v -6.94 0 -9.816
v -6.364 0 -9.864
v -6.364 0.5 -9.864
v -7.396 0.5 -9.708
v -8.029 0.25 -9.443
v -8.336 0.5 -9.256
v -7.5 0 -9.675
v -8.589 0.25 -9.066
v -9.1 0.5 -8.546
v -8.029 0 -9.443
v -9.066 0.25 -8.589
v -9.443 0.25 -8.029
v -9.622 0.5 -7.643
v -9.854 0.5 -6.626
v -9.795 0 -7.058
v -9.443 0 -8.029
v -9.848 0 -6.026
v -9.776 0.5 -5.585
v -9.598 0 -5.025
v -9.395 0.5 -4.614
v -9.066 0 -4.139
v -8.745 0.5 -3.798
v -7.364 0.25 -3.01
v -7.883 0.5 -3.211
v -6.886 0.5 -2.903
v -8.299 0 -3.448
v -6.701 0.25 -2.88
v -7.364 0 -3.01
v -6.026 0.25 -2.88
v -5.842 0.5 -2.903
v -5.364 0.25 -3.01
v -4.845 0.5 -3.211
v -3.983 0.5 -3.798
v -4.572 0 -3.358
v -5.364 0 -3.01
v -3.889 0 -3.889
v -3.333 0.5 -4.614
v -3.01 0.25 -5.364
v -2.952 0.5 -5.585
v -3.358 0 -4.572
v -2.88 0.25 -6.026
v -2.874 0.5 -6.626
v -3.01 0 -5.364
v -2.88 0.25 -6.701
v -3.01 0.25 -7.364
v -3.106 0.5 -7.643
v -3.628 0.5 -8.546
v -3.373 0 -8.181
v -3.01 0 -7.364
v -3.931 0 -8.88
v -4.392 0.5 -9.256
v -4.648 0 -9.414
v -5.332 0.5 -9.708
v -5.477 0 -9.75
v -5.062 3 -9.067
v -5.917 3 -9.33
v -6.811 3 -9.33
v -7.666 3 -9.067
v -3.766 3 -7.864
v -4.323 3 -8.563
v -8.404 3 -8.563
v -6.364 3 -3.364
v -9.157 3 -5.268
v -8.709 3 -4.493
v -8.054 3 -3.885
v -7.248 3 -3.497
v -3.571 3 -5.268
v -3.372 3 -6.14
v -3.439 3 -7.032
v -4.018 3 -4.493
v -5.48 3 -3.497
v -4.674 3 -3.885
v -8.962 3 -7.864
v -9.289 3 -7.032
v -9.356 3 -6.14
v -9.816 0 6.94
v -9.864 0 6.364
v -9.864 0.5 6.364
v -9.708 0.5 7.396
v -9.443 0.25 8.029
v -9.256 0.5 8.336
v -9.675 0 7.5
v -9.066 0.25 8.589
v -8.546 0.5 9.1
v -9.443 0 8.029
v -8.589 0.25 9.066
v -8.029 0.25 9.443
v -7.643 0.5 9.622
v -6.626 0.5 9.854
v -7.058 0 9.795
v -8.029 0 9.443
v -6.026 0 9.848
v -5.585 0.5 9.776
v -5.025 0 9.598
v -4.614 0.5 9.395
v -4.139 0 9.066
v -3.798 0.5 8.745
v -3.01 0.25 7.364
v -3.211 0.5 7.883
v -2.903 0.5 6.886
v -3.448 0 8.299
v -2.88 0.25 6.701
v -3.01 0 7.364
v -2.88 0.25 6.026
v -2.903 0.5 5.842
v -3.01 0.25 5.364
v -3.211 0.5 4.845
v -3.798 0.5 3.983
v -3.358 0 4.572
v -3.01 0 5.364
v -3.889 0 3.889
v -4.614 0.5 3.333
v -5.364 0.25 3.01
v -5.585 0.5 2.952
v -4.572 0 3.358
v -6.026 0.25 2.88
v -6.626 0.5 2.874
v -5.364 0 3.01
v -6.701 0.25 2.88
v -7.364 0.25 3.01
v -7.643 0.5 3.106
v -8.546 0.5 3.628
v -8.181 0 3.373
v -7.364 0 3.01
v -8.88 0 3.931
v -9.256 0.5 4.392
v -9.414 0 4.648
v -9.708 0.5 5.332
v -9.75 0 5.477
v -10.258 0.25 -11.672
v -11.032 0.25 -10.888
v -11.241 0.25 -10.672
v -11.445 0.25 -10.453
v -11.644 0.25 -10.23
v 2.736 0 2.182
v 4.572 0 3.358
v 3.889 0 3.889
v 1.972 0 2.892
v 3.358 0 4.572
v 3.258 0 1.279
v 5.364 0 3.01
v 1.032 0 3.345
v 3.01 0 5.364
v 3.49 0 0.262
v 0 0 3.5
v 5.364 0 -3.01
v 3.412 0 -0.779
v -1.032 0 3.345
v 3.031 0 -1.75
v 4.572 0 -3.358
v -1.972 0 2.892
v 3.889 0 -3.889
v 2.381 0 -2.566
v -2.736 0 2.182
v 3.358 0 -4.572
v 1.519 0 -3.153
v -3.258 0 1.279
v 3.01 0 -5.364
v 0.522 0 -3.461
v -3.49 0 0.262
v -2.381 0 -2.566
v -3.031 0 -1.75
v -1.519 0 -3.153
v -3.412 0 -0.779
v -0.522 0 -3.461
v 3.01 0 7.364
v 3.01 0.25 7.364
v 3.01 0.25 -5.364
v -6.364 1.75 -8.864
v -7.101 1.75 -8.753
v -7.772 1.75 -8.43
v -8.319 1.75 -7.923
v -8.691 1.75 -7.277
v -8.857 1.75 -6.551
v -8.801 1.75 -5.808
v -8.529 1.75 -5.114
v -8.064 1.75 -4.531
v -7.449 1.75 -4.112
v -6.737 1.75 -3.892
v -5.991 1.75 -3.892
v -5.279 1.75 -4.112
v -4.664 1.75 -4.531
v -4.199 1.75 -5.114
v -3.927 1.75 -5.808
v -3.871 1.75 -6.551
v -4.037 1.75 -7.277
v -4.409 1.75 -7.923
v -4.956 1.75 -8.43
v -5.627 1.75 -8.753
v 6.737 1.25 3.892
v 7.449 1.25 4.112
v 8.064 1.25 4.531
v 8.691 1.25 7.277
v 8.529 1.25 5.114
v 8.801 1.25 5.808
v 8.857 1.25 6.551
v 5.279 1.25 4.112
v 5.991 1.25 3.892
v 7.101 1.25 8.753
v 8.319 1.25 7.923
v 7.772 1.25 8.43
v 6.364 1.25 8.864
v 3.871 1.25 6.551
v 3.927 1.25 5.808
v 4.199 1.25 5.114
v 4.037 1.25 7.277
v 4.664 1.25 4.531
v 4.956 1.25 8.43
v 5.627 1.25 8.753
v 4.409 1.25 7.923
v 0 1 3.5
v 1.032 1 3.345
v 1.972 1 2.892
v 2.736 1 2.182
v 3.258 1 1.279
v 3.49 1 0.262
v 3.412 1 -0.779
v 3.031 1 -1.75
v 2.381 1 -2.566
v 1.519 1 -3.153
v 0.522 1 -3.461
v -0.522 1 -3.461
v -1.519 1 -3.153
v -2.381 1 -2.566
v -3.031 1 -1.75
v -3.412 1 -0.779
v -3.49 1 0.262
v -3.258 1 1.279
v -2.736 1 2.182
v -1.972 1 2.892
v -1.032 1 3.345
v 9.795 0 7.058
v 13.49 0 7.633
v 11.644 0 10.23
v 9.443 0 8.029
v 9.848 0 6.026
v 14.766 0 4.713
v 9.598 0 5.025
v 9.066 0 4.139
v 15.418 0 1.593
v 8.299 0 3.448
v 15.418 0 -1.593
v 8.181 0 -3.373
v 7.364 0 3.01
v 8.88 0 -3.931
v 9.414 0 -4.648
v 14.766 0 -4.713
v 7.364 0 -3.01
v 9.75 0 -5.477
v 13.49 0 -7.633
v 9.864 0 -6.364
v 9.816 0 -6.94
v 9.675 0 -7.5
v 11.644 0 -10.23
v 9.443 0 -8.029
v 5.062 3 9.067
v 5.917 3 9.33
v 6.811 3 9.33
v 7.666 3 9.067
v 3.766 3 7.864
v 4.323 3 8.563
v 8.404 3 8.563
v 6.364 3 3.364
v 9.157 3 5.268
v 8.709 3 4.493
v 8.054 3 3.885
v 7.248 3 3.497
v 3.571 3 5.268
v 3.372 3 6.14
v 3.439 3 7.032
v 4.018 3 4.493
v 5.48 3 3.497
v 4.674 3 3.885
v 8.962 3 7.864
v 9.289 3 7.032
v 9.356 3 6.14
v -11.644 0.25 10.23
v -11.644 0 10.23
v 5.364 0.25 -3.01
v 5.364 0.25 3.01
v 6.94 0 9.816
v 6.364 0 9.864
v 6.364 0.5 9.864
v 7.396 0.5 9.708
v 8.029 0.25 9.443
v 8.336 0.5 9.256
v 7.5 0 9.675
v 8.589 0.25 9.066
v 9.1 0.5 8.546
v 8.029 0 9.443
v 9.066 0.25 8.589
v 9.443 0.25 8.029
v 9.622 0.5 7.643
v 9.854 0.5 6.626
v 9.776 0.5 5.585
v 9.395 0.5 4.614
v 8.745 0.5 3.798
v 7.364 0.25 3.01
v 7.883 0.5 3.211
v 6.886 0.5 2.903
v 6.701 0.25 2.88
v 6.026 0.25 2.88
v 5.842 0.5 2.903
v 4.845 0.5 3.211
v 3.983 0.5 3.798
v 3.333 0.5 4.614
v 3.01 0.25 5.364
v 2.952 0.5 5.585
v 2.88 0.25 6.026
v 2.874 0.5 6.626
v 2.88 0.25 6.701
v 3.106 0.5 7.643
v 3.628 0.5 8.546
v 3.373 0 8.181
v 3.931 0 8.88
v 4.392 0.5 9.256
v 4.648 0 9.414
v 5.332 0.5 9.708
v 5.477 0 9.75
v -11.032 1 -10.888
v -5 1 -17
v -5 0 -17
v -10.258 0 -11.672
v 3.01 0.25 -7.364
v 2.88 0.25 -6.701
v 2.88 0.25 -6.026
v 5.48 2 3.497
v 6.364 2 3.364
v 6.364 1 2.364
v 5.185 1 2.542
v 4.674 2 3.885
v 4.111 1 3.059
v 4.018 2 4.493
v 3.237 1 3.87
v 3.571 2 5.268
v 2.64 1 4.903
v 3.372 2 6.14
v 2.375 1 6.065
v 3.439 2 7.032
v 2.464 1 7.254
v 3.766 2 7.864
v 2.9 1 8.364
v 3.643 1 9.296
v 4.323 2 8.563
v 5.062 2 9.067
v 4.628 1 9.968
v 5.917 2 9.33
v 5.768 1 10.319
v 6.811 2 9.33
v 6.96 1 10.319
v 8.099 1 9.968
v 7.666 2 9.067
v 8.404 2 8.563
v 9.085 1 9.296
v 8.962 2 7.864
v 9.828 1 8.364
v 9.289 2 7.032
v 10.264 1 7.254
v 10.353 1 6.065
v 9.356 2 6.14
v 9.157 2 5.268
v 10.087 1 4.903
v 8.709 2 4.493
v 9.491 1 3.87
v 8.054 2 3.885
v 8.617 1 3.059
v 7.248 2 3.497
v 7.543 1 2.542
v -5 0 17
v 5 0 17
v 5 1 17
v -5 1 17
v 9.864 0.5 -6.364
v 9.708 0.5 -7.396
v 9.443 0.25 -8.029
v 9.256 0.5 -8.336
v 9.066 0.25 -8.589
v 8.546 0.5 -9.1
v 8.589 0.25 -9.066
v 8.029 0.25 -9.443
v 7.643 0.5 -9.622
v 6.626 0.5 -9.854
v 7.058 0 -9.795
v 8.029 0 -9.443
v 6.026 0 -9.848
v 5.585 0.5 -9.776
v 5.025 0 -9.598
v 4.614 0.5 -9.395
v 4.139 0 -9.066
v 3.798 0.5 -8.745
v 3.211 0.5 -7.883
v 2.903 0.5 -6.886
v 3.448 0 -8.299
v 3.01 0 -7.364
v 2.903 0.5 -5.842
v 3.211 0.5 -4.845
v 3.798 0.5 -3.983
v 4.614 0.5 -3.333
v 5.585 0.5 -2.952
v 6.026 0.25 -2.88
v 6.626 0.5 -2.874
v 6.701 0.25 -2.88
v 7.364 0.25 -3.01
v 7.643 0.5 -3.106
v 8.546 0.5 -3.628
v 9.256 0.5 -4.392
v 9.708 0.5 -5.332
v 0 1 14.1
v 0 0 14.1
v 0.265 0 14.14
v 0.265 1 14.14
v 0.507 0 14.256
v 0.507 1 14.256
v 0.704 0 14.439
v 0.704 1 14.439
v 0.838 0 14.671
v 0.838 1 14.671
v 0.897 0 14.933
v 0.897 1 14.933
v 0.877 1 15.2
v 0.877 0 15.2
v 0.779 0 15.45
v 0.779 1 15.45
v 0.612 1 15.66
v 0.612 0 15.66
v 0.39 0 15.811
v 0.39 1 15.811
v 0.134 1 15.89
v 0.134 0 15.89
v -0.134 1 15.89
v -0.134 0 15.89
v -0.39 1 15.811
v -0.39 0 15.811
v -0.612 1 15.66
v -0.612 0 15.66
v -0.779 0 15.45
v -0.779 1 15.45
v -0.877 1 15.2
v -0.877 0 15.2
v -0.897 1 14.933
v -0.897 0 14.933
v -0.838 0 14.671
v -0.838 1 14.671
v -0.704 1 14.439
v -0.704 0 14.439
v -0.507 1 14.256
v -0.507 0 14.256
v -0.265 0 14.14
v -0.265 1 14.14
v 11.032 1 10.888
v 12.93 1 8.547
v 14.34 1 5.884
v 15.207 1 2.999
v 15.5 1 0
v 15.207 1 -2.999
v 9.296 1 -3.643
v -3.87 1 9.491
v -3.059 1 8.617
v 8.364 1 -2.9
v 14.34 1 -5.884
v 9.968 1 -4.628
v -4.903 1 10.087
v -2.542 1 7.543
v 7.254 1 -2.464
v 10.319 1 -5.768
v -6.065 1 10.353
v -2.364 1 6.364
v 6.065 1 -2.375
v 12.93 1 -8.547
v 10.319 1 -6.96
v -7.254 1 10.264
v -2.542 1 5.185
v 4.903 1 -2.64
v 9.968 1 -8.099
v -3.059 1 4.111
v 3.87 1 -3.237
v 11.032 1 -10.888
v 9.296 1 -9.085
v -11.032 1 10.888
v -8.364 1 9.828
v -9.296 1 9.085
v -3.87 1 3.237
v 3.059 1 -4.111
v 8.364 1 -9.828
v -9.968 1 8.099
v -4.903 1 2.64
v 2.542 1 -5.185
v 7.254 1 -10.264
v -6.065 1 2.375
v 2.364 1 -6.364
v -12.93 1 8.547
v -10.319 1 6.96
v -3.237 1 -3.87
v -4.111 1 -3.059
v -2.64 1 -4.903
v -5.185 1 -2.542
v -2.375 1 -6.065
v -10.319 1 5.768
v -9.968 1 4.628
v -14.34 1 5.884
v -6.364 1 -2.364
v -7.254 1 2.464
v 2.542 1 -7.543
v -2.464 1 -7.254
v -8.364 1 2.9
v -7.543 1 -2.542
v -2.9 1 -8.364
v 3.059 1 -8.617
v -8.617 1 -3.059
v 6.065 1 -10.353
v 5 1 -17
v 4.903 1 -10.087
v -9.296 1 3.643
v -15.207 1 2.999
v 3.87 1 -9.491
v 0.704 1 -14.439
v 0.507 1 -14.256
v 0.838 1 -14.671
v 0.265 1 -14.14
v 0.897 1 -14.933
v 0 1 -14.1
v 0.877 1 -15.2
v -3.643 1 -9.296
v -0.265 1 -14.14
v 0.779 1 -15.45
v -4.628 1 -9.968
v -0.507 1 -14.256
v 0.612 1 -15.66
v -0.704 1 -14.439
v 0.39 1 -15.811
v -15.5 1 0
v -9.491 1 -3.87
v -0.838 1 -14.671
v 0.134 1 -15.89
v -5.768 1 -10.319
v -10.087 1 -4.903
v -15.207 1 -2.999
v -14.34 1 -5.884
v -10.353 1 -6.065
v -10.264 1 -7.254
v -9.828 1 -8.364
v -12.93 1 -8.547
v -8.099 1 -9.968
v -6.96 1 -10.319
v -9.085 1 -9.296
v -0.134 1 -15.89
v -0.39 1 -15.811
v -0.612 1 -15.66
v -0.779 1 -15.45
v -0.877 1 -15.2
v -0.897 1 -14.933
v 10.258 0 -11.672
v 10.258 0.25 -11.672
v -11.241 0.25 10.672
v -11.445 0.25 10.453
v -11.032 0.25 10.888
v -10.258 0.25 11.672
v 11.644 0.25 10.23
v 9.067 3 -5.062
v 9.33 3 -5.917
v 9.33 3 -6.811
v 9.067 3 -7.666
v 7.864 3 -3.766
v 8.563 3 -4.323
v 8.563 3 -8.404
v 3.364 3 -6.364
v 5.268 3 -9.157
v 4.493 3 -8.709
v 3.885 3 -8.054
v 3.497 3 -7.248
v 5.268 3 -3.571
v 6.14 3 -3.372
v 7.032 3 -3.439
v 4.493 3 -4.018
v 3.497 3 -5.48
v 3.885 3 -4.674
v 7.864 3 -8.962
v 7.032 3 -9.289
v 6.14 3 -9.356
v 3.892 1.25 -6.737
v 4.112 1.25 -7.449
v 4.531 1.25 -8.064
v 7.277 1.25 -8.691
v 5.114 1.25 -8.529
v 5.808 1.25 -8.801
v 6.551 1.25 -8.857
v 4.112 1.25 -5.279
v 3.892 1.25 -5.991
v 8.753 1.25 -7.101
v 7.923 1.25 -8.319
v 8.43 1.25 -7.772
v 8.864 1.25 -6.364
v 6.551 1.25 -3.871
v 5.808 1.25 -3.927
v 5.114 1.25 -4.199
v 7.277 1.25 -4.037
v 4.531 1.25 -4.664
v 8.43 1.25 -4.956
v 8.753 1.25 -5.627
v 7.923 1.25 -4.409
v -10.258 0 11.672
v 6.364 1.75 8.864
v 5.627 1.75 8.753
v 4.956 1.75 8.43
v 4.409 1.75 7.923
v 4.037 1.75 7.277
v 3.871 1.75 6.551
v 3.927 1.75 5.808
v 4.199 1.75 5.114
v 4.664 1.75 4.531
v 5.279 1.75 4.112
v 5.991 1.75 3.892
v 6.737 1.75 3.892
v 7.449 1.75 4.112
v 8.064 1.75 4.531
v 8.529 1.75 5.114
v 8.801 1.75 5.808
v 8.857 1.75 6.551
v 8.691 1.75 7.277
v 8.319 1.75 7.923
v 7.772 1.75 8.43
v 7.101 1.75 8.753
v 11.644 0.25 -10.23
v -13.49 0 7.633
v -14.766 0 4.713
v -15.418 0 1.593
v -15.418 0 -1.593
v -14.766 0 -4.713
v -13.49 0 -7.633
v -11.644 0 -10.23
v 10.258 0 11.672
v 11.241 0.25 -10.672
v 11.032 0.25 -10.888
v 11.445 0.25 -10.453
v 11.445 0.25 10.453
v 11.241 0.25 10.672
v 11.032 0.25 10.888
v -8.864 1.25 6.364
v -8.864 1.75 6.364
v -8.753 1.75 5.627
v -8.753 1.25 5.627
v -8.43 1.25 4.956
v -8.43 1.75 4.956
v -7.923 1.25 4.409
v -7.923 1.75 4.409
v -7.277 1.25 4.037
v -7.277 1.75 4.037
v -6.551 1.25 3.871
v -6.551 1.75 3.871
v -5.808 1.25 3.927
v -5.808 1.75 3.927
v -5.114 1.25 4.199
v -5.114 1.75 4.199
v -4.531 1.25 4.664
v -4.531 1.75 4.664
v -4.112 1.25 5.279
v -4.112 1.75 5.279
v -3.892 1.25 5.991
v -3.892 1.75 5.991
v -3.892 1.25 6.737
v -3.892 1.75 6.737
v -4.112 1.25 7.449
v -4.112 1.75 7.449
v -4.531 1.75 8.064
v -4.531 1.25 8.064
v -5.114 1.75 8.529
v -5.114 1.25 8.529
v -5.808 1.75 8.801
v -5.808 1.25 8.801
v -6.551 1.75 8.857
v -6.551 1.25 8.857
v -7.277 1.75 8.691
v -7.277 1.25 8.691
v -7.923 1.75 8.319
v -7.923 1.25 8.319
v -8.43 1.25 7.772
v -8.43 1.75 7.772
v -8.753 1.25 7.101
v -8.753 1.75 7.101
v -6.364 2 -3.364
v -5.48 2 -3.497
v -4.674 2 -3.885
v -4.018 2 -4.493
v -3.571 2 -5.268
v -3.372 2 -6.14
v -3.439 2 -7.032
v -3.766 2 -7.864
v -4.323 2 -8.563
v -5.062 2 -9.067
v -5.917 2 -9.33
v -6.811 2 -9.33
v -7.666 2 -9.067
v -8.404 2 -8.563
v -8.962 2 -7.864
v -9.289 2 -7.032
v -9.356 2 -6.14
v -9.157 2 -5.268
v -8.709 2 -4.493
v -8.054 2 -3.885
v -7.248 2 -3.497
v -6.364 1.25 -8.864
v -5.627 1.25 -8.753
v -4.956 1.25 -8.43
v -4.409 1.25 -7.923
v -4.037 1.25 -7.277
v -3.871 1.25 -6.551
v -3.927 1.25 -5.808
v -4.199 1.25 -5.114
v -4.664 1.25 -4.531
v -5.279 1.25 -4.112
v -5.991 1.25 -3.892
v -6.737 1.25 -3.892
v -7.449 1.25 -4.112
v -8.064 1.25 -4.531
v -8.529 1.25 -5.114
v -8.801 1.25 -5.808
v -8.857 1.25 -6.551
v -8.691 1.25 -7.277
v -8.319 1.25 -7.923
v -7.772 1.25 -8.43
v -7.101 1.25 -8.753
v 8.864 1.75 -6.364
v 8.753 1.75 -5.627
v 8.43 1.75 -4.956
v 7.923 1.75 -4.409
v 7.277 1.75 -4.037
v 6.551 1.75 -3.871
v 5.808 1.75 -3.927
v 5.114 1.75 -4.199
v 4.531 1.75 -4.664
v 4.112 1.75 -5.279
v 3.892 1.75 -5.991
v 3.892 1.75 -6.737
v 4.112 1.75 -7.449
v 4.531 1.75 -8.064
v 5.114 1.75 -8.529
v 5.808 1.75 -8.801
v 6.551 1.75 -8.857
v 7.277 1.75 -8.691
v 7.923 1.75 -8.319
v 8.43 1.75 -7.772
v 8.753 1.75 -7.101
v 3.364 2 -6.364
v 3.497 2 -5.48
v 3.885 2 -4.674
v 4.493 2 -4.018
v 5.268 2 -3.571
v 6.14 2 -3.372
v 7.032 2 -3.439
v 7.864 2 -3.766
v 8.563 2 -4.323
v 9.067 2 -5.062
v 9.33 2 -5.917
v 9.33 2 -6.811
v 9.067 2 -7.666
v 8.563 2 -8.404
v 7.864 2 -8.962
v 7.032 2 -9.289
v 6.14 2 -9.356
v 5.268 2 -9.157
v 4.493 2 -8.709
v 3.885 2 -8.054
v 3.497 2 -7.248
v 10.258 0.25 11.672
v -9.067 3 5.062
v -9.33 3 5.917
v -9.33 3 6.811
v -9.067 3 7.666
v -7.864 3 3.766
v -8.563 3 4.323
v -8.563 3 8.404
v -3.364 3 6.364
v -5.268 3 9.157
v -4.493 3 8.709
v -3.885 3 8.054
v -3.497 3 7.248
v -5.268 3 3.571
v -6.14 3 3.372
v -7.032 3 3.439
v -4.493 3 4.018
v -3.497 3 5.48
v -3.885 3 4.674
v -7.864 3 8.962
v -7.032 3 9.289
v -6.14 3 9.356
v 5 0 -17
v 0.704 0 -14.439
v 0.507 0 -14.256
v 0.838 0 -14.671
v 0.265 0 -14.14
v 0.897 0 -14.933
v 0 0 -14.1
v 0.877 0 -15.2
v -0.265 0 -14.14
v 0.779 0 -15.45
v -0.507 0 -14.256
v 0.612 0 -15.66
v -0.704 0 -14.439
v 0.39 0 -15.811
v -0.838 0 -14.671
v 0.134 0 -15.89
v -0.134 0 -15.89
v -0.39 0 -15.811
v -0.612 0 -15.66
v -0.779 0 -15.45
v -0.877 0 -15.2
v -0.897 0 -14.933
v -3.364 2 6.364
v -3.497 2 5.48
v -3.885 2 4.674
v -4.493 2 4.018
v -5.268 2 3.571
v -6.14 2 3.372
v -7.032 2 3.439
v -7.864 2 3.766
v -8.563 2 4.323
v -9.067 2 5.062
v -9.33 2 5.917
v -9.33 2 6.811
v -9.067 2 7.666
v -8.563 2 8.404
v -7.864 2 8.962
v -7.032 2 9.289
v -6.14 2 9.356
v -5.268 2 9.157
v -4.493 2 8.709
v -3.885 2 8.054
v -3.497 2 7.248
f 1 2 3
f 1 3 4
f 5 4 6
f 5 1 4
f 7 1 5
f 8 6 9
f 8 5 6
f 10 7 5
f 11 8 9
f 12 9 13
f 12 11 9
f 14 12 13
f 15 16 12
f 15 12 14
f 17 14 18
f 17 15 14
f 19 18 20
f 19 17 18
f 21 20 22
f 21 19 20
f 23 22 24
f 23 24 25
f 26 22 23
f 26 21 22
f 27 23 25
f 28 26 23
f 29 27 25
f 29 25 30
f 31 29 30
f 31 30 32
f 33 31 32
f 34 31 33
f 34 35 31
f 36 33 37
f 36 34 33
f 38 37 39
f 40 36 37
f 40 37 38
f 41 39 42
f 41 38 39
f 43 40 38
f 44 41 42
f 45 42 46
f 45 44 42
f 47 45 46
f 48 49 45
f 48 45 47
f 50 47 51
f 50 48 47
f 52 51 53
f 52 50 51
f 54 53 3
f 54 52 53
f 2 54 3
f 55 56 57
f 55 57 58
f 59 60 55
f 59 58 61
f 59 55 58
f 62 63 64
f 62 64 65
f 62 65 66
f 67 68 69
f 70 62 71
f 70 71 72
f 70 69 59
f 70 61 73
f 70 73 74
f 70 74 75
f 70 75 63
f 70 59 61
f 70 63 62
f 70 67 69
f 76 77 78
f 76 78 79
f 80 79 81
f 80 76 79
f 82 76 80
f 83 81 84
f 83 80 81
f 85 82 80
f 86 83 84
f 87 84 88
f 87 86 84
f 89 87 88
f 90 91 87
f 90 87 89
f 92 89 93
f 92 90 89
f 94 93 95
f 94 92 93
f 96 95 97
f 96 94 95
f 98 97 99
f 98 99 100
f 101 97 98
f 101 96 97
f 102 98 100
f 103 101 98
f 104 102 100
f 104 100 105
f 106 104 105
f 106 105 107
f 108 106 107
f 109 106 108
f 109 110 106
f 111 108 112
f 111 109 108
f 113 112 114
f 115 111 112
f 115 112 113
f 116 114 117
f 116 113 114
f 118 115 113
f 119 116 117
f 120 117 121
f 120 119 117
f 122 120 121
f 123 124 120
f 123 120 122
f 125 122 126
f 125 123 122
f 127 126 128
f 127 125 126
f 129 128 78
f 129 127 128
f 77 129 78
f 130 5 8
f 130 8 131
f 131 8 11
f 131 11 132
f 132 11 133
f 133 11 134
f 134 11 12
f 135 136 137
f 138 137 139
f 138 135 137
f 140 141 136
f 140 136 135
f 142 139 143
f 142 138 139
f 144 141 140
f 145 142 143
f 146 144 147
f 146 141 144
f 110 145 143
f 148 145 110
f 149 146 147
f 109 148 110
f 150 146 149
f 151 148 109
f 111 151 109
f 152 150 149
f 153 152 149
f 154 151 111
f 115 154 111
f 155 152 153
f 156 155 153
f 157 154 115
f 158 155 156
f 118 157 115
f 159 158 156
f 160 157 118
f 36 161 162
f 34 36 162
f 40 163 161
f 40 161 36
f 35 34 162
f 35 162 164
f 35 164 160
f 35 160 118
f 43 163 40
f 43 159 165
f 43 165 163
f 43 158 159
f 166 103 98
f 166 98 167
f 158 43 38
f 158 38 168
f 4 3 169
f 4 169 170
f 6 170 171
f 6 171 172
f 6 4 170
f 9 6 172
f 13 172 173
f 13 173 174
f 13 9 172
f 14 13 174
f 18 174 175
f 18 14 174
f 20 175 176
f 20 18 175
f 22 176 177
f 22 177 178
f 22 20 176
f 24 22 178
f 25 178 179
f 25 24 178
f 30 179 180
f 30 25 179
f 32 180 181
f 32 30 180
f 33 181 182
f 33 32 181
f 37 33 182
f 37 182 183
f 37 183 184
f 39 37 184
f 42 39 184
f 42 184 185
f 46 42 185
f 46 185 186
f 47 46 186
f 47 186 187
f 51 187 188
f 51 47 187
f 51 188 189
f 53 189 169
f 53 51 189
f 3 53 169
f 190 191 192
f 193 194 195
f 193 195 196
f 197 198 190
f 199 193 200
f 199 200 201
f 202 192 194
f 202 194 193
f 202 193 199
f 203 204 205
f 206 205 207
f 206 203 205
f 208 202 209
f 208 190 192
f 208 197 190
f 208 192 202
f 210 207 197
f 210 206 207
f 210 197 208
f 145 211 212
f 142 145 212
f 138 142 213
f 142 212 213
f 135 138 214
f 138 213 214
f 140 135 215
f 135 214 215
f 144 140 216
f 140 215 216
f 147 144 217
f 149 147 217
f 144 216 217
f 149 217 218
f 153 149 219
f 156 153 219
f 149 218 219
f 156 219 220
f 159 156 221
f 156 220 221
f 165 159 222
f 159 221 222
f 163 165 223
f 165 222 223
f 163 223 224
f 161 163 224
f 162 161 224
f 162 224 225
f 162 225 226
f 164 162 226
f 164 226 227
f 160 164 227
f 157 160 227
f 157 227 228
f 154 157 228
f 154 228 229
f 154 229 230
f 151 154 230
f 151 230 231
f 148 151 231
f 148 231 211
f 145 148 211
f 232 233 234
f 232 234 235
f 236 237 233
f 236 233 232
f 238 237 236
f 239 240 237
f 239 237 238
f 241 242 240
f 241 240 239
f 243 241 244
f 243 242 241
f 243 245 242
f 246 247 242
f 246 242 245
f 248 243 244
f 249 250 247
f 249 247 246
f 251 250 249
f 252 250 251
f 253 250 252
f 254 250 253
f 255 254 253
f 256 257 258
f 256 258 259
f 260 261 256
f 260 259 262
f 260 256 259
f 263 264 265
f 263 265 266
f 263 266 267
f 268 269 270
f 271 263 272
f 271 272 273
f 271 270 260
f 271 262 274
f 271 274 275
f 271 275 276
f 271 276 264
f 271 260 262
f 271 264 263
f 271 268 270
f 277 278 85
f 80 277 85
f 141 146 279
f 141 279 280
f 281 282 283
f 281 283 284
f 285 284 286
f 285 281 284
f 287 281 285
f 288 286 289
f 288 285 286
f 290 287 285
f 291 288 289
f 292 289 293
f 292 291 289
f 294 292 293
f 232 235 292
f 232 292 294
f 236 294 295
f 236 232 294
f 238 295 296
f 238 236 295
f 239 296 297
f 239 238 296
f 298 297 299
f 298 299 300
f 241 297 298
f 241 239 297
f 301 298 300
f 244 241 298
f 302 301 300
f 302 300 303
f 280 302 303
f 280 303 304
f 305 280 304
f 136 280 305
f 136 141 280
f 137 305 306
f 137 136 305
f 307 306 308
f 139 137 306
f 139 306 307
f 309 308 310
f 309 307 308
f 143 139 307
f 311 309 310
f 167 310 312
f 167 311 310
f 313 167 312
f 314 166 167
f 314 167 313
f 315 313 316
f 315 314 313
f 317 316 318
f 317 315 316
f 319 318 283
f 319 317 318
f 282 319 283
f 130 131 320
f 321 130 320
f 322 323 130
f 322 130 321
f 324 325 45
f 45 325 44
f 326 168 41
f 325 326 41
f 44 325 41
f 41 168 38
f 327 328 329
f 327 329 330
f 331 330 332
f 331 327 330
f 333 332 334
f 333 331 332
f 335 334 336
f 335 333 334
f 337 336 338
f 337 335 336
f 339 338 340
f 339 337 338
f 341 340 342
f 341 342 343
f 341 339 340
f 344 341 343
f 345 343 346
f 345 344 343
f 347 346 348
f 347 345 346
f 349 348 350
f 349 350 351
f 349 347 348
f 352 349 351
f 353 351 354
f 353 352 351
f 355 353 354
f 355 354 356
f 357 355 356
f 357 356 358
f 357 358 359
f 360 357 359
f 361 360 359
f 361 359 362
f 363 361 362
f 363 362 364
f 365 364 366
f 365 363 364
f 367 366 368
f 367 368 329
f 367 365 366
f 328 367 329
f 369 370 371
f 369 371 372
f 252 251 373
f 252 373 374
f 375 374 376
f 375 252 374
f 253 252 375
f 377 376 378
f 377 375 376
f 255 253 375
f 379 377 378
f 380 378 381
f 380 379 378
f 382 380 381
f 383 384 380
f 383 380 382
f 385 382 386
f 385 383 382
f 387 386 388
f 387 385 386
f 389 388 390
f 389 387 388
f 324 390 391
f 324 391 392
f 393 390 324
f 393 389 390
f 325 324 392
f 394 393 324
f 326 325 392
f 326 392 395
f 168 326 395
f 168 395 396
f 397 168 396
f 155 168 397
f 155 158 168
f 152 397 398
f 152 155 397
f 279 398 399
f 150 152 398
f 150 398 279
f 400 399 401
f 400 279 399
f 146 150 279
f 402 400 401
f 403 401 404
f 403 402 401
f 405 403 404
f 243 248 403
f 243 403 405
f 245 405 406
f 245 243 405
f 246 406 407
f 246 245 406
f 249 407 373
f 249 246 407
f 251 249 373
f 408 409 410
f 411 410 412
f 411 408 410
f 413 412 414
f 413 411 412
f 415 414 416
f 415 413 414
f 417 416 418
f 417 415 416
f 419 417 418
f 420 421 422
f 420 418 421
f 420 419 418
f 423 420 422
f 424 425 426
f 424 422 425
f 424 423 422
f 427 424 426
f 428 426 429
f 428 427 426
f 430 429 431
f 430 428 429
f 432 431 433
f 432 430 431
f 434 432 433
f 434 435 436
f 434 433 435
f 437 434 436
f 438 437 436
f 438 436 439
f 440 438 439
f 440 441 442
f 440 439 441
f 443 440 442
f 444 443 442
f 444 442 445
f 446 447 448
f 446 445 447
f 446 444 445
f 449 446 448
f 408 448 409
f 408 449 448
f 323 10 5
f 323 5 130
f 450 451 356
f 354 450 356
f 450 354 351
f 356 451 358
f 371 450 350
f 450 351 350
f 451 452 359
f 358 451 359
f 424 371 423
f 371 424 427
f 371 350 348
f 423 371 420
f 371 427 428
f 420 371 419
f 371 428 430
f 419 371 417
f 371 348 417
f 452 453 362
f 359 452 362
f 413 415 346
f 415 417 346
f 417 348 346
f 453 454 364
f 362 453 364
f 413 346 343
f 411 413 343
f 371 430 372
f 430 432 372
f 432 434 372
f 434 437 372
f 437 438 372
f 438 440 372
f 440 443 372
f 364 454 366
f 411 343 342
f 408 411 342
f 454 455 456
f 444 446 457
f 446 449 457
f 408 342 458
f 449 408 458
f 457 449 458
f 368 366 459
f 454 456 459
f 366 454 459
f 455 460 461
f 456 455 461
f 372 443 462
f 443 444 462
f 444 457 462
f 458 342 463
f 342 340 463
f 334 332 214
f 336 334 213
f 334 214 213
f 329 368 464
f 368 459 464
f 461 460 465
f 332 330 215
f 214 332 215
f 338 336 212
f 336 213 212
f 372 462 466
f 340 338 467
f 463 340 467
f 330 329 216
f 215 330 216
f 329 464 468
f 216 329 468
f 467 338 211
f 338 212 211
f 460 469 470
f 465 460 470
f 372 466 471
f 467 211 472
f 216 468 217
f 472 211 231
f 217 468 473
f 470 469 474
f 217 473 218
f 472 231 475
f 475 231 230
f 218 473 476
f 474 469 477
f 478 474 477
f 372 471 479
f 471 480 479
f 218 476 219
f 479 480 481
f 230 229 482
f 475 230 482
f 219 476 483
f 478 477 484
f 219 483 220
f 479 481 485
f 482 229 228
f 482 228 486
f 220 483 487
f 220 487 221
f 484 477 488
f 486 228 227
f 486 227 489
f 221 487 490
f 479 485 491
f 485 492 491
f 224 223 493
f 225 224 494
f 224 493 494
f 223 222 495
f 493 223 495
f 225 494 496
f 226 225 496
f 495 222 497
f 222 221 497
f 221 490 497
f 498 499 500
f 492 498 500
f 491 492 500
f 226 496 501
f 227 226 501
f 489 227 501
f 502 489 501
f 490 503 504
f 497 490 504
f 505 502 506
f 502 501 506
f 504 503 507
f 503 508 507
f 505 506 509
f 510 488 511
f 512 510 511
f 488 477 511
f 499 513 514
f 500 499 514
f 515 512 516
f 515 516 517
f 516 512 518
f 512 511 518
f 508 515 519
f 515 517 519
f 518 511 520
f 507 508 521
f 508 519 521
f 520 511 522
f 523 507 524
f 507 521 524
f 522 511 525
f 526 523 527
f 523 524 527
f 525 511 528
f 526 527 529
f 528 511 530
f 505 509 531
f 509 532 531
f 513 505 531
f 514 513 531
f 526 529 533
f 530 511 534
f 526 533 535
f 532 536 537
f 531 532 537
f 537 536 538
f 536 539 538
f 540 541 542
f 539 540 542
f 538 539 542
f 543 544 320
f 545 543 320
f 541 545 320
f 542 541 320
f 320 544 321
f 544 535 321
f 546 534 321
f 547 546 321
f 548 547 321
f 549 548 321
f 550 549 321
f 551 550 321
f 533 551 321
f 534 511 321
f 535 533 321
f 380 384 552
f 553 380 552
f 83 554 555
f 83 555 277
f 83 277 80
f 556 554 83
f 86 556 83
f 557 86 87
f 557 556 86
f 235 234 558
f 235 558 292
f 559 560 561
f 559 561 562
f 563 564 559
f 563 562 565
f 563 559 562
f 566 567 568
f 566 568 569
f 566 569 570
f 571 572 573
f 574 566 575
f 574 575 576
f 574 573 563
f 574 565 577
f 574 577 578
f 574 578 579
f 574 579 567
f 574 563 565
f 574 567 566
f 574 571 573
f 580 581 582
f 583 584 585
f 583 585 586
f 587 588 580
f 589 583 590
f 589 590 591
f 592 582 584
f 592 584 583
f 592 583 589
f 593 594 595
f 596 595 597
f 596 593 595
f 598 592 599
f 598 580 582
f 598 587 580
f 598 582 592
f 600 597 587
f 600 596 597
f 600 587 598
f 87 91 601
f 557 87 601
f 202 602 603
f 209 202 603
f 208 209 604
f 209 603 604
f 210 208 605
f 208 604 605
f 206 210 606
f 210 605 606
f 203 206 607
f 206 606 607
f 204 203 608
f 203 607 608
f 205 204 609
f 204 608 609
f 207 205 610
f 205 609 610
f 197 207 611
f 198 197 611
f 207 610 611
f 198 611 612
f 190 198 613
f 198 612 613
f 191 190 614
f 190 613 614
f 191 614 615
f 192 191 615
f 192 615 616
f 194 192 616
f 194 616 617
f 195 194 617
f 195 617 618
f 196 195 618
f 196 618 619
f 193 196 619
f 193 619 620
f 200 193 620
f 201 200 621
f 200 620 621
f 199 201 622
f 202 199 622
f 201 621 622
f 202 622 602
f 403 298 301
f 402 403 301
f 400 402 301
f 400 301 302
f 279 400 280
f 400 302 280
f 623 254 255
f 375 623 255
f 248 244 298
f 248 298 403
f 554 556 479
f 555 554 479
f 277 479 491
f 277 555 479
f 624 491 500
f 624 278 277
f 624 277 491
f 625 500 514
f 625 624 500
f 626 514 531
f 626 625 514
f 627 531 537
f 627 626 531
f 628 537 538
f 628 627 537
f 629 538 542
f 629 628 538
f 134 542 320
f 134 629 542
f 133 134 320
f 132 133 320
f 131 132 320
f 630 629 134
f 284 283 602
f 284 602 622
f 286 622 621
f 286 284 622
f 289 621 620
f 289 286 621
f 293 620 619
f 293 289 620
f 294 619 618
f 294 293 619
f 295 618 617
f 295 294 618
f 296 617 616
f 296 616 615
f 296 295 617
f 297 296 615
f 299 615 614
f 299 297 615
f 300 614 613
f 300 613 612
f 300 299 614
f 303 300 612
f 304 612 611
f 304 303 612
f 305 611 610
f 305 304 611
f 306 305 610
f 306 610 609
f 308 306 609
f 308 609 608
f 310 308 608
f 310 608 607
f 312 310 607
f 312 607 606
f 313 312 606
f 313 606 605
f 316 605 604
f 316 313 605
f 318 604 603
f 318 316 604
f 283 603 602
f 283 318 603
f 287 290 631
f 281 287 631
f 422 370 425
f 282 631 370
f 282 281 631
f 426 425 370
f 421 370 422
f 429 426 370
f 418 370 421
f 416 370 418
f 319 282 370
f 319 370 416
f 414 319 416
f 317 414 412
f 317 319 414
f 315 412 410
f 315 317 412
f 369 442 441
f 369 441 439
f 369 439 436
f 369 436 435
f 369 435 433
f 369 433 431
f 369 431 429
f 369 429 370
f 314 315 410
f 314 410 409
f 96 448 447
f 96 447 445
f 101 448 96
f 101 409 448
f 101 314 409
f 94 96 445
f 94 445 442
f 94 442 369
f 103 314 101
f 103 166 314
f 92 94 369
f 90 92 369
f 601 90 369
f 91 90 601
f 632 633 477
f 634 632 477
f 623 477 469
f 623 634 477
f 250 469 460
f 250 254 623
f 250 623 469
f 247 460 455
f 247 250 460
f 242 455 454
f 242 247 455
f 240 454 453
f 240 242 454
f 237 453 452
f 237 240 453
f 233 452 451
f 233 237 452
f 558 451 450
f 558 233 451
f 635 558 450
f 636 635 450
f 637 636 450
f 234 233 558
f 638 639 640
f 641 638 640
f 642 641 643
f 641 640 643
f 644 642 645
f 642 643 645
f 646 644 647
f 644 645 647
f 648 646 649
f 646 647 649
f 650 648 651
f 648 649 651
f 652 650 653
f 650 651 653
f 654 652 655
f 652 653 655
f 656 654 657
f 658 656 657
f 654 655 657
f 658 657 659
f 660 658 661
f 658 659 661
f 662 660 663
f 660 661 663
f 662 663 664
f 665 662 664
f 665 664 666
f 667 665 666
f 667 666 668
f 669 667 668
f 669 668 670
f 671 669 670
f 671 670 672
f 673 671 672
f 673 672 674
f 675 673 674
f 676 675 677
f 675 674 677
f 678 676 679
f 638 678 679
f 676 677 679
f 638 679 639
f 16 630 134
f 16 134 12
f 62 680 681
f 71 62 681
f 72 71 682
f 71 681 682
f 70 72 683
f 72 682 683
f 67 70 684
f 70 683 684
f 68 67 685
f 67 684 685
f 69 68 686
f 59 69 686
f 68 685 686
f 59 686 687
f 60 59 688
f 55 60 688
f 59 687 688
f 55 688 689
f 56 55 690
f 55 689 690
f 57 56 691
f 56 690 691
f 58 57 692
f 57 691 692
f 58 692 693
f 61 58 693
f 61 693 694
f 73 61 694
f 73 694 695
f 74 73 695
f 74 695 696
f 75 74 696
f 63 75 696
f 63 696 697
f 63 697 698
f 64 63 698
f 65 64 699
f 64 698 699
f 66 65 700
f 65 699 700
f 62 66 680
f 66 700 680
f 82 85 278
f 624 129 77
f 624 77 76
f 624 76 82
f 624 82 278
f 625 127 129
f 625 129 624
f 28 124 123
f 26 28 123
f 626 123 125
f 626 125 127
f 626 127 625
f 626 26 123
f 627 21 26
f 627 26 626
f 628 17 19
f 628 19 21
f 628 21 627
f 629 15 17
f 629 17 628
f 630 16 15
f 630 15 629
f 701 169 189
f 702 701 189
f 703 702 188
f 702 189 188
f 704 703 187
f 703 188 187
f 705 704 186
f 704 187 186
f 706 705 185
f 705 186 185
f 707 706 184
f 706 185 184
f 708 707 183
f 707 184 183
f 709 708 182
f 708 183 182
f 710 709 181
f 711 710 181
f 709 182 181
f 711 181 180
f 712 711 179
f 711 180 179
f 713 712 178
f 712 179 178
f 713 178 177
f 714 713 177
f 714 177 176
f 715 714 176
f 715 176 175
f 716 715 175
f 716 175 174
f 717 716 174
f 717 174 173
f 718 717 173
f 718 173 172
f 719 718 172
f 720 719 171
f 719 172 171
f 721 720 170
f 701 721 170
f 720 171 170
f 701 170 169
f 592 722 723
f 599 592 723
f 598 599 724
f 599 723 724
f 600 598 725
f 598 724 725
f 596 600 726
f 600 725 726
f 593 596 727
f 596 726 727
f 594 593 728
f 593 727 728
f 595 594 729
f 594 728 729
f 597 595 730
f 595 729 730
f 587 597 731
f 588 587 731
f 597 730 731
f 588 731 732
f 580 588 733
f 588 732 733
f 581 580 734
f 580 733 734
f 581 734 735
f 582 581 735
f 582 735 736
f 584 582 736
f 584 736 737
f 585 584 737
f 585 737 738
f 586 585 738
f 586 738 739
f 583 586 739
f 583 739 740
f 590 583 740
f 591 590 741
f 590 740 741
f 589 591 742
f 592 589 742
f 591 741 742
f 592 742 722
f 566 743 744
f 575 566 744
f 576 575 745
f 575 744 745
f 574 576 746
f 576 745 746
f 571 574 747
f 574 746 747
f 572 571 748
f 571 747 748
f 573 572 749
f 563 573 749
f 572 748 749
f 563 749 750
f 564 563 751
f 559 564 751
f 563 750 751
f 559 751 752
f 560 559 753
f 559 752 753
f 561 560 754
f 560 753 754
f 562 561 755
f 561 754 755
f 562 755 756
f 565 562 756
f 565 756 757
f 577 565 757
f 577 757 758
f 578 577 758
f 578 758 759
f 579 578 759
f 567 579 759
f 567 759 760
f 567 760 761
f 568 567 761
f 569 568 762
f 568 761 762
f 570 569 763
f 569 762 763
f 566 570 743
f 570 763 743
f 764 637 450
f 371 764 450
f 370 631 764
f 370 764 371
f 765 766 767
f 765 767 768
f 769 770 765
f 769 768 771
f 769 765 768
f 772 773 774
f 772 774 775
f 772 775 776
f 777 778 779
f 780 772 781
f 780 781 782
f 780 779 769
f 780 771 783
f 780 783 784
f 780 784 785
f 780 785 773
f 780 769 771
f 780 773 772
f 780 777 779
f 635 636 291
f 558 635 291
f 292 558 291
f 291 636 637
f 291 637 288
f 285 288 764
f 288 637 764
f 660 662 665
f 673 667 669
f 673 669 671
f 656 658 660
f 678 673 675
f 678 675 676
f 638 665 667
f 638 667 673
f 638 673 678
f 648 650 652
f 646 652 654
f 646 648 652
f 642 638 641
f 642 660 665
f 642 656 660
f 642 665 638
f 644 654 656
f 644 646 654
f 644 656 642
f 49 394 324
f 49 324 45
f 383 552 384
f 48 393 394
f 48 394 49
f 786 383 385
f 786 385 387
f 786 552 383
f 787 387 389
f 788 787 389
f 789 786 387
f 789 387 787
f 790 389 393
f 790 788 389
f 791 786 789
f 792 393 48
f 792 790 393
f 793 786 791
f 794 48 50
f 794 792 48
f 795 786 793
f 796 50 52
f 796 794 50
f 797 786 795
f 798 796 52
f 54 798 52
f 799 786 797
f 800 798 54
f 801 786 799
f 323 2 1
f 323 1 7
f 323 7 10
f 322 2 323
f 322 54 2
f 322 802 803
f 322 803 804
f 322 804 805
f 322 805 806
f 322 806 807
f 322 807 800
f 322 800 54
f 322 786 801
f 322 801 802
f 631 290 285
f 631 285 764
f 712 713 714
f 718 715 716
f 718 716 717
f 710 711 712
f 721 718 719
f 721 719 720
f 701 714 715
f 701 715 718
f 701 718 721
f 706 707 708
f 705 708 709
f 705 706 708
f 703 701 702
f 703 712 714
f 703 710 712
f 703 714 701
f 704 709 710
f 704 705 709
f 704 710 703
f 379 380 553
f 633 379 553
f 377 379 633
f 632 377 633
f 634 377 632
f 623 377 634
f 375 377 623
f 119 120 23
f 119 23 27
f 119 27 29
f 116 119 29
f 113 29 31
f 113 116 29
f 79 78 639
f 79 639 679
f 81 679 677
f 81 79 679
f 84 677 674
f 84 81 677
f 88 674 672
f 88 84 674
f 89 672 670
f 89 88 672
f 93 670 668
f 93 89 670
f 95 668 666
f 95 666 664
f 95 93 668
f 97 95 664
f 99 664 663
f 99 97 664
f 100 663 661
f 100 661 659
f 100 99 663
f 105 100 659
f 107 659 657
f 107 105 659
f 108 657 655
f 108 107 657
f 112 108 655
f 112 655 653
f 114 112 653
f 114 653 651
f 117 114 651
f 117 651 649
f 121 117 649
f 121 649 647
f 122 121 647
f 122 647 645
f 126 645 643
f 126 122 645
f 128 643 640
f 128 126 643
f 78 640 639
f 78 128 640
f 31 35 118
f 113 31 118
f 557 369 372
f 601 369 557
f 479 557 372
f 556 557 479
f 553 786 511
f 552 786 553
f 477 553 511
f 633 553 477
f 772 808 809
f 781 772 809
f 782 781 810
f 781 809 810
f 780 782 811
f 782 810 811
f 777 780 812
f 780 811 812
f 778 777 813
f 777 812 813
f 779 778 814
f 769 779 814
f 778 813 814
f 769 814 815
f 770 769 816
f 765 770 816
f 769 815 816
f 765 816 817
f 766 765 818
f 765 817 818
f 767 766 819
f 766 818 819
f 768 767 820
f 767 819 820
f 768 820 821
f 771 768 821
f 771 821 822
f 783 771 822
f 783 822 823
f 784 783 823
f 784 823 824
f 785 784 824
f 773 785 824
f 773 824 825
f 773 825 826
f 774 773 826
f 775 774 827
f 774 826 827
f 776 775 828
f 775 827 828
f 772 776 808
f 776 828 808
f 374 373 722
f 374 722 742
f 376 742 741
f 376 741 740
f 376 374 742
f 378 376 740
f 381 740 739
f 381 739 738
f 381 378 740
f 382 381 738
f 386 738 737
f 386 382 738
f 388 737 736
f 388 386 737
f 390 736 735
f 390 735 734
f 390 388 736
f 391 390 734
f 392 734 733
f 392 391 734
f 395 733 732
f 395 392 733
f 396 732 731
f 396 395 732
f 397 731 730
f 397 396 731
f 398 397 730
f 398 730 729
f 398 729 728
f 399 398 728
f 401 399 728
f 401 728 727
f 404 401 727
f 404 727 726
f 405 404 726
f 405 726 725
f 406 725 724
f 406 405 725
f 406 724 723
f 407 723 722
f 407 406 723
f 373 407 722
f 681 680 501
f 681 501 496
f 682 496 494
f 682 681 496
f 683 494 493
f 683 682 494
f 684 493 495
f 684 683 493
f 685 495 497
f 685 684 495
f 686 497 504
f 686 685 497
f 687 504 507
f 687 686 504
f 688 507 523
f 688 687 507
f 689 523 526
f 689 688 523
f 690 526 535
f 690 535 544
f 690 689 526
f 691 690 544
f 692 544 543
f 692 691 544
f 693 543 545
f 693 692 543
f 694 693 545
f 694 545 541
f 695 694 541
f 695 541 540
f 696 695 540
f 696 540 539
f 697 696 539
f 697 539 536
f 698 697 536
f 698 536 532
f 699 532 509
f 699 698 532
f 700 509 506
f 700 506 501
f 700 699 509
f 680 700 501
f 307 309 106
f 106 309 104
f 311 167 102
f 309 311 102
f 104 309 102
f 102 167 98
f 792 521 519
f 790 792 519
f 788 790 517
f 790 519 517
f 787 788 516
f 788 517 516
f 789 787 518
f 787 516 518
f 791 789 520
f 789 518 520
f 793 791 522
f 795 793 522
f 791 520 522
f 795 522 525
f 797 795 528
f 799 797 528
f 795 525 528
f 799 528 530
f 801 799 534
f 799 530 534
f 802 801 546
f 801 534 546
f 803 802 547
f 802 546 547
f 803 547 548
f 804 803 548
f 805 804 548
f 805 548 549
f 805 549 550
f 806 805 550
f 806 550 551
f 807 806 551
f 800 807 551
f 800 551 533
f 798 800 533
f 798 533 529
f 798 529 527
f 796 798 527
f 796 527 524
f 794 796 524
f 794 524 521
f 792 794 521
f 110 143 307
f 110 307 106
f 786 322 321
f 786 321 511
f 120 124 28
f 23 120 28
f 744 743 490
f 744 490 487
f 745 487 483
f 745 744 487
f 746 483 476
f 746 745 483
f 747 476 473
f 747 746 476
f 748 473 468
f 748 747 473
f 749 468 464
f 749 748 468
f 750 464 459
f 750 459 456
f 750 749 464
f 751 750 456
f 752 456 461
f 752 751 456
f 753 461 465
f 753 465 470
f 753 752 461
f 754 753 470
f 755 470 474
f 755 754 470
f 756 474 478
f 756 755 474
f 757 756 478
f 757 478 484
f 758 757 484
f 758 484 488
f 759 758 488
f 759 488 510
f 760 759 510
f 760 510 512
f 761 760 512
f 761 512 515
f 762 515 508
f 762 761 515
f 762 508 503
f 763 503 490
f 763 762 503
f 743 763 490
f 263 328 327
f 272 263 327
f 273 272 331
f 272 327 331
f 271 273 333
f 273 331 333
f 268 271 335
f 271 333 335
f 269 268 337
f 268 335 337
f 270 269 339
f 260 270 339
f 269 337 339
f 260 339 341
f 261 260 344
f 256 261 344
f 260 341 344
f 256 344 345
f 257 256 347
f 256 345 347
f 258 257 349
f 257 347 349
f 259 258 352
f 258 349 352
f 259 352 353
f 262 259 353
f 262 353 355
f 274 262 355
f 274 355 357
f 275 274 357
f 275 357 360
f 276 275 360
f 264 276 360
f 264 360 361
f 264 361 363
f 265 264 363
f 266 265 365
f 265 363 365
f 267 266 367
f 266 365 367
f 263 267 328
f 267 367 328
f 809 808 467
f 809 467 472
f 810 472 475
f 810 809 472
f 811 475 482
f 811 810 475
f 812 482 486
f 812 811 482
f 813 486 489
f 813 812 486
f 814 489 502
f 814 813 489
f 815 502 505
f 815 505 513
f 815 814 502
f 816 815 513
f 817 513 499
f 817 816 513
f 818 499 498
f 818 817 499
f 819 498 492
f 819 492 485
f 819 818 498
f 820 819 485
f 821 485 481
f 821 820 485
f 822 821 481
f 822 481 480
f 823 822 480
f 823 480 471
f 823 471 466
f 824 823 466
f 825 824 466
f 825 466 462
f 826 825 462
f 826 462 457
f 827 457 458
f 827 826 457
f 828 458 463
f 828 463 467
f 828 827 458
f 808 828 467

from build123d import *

# Parameters (mm, degrees)
BOSS_EXTRUDE1_DEPTH = 1
SKETCH2_R           = 3.5
CUT_EXTRUDE1_DEPTH  = 24.027157879
SKETCH3_R           = 3
BOSS_EXTRUDE2_DEPTH = 2
CIRPATTERN1_COUNT   = 4
CHAMFER1_SIZE       = 1
CIRPATTERN2_COUNT   = 4
CUT_EXTRUDE4_DEPTH  = 0.25
SKETCH6_R           = 2.5
BOSS_EXTRUDE3_DEPTH = 0.5
CIRPATTERN3_COUNT   = 4
SKETCH7_R           = 0.9
CUT_EXTRUDE5_DEPTH  = 24.092206478


with BuildPart() as part:
    # Sketch1 → Boss-Extrude1 (new body)
    with BuildSketch(Plane(origin=(0, 0, 0), x_dir=(1, 0, 0), z_dir=(0, 1, 0))):
        with BuildLine():
            Line((5, 17), (11.032262936, 10.887569725))
            ThreePointArc((11.032262936, 10.887569725), (15.5, 0), (11.032262936, -10.887569725))
            Line((11.032262936, -10.887569725), (5, -17))
            Line((5, -17), (-5, -17))
            Line((-5, -17), (-11.032262936, -10.887569725))
            ThreePointArc((-11.032262936, -10.887569725), (-15.5, 0), (-11.032262936, 10.887569725))
            Line((-11.032262936, 10.887569725), (-5, 17))
            Line((-5, 17), (5, 17))
        make_face()
    extrude(amount=BOSS_EXTRUDE1_DEPTH)

    # Sketch2 → Cut-Extrude1 (cut, through all)
    with BuildSketch(Plane(origin=(0, 1, 0), x_dir=(1, 0, 0), z_dir=(0, 1, 0))):
        with Locations(Location((0, 0, 0), (0, 0, 270))):
            Circle(SKETCH2_R)
    extrude(amount=-CUT_EXTRUDE1_DEPTH, mode=Mode.SUBTRACT)

    # Sketch3 → Boss-Extrude2 (add)
    with BuildSketch(Plane(origin=(0, 1, 0), x_dir=(1, 0, 0), z_dir=(0, 1, 0))):
        with Locations(Location((-6.363961031, 6.363961031, 0), (0, 0, 270))):
            Circle(SKETCH3_R)
    boss_extrude2 = extrude(amount=BOSS_EXTRUDE2_DEPTH)

    # CirPattern1: Boss-Extrude2 ×4 about axis
    cirpattern1_axis = Axis((0, 0, 0), (0, 1, 0))
    for i in range(1, CIRPATTERN1_COUNT):
        add(boss_extrude2.rotate(cirpattern1_axis, i * 360 / CIRPATTERN1_COUNT))

    # Chamfer1
    chamfer1_edges = [part.edges().sort_by_distance(p)[0] for p in [
        (-6.363961031, 1, -9.363961031),
        (-9.363961031, 1, 6.363961031),
        (6.363961031, 1, 9.363961031),
        (9.363961031, 1, -6.363961031),
    ]]
    chamfer(chamfer1_edges, length=CHAMFER1_SIZE)

    # Sketch4 → Cut-Revolve1 (revolve, cut)
    with BuildSketch(Plane(origin=(0, 0, 0), x_dir=(-0.7071067811865477, 0, -0.7071067811865475), z_dir=(0.7071067811865475, 0, -0.7071067811865477)), mode=Mode.PRIVATE) as cut_revolve1_sk:
        Polygon((12.5, 0), (9, 0), (9, 1.75), (11.5, 1.75), (12.5, 0.5), align=None)
    cut_revolve1 = revolve(cut_revolve1_sk.sketch.rotate(Axis((-6.363961031, 1, -6.363961031), (0, 1, 0)), 315), axis=Axis((-6.363961031, 1, -6.363961031), (0, 1, 0)), mode=Mode.SUBTRACT)

    # CirPattern2: Cut-Revolve1 ×4 about axis
    cirpattern2_axis = Axis((0, 0, 0), (0, 1, 0))
    for i in range(1, CIRPATTERN2_COUNT):
        add(cut_revolve1.rotate(cirpattern2_axis, i * 360 / CIRPATTERN2_COUNT), mode=Mode.SUBTRACT)

    # Sketch5 → Cut-Extrude4 (cut)
    with BuildSketch(Plane.XZ):
        with BuildLine():
            Line((-3.009859064, 7.363961031), (3.009859064, 7.363961031))
            ThreePointArc((3.009859064, 7.363961031), (2.863961031, 6.363961031), (3.009859064, 5.363961031))
            Line((3.009859064, 5.363961031), (-3.009859064, 5.363961031))
            ThreePointArc((-3.009859064, 5.363961031), (-2.863961031, 6.363961031), (-3.009859064, 7.363961031))
        make_face()
        with BuildLine():
            Line((-7.363961031, 3.009859064), (-7.363961031, -3.009859064))
            ThreePointArc((-7.363961031, -3.009859064), (-6.363961031, -2.863961031), (-5.363961031, -3.009859064))
            Line((-5.363961031, -3.009859064), (-5.363961031, 3.009859064))
            ThreePointArc((-5.363961031, 3.009859064), (-6.363961031, 2.863961031), (-7.363961031, 3.009859064))
        make_face()
        with BuildLine():
            Line((-3.009859064, -5.363961031), (3.009859064, -5.363961031))
            ThreePointArc((3.009859064, -5.363961031), (2.863961031, -6.363961031), (3.009859064, -7.363961031))
            Line((3.009859064, -7.363961031), (-3.009859064, -7.363961031))
            ThreePointArc((-3.009859064, -7.363961031), (-2.863961031, -6.363961031), (-3.009859064, -5.363961031))
        make_face()
        with BuildLine():
            Line((5.363961031, -3.009859064), (5.363961031, 3.009859064))
            ThreePointArc((5.363961031, 3.009859064), (6.363961031, 2.863961031), (7.363961031, 3.009859064))
            Line((7.363961031, 3.009859064), (7.363961031, -3.009859064))
            ThreePointArc((7.363961031, -3.009859064), (6.363961031, -2.863961031), (5.363961031, -3.009859064))
        make_face()
        with BuildLine():
            Line((8.028562495, 9.442776057), (10.257954735, 11.672168297))
            Line((10.257954735, 11.672168297), (11.032262936, 10.887569725))
            ThreePointArc((11.032262936, 10.887569725), (11.343108447, 10.563327637), (11.644428208, 10.230214646))
            Line((11.644428208, 10.230214646), (9.442776057, 8.028562495))
            ThreePointArc((9.442776057, 8.028562495), (8.838834765, 8.838834765), (8.028562495, 9.442776057))
        make_face()
        with BuildLine():
            Line((-8.028562495, 9.442776057), (-10.257954735, 11.672168297))
            Line((-10.257954735, 11.672168297), (-11.032262936, 10.887569725))
            ThreePointArc((-11.032262936, 10.887569725), (-11.343108447, 10.563327637), (-11.644428208, 10.230214646))
            Line((-11.644428208, 10.230214646), (-9.442776057, 8.028562495))
            ThreePointArc((-9.442776057, 8.028562495), (-8.838834765, 8.838834765), (-8.028562495, 9.442776057))
        make_face()
        with BuildLine():
            Line((-8.028562495, -9.442776057), (-10.257954735, -11.672168297))
            Line((-10.257954735, -11.672168297), (-11.032262936, -10.887569725))
            ThreePointArc((-11.032262936, -10.887569725), (-11.343108447, -10.563327637), (-11.644428208, -10.230214646))
            Line((-11.644428208, -10.230214646), (-9.442776057, -8.028562495))
            ThreePointArc((-9.442776057, -8.028562495), (-8.838834765, -8.838834765), (-8.028562495, -9.442776057))
        make_face()
        with BuildLine():
            Line((8.028562495, -9.442776057), (10.257954735, -11.672168297))
            Line((10.257954735, -11.672168297), (11.032262936, -10.887569725))
            ThreePointArc((11.032262936, -10.887569725), (11.343108447, -10.563327637), (11.644428208, -10.230214646))
            Line((11.644428208, -10.230214646), (9.442776057, -8.028562495))
            ThreePointArc((9.442776057, -8.028562495), (8.838834765, -8.838834765), (8.028562495, -9.442776057))
        make_face()
    extrude(amount=-CUT_EXTRUDE4_DEPTH, mode=Mode.SUBTRACT)

    # Sketch6 → Boss-Extrude3 (add)
    with BuildSketch(Plane.XZ.offset(-1.75)):
        with Locations(Location((-6.363961031, -6.363961031, 0), (0, 0, 270))):
            Circle(SKETCH6_R)
    boss_extrude3 = extrude(amount=BOSS_EXTRUDE3_DEPTH)

    # CirPattern3: Boss-Extrude3 ×4 about axis
    cirpattern3_axis = Axis((0, 0, 0), (0, 1, 0))
    for i in range(1, CIRPATTERN3_COUNT):
        add(boss_extrude3.rotate(cirpattern3_axis, i * 360 / CIRPATTERN3_COUNT))

    # Sketch7 → Cut-Extrude5 (cut, through all)
    with BuildSketch(Plane(origin=(0, 1, 0), x_dir=(1, 0, 0), z_dir=(0, 1, 0))):
        with Locations(Location((0, 15, 0), (0, 0, 270))):
            Circle(SKETCH7_R)
    cut_extrude5 = extrude(amount=-CUT_EXTRUDE5_DEPTH, mode=Mode.SUBTRACT)

    # Mirror1: Cut-Extrude5 across plane
    add(cut_extrude5.mirror(Plane.XY), mode=Mode.SUBTRACT)


solid = part.part
